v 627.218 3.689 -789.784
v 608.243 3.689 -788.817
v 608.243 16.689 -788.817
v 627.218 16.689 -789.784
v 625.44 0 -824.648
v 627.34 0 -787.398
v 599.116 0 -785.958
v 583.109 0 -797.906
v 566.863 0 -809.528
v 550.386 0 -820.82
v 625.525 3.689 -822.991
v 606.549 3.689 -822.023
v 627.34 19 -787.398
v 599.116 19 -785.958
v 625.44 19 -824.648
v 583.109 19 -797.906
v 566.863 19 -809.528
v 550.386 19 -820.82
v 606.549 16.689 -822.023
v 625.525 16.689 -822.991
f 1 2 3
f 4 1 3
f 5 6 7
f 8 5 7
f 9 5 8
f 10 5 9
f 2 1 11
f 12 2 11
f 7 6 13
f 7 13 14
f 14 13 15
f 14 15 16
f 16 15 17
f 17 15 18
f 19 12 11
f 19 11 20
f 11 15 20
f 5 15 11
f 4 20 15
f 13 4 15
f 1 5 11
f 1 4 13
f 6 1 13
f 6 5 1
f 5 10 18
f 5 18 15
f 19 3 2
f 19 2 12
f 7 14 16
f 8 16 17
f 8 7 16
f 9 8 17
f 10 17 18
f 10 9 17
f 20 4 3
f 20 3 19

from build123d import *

# Parameters (mm, degrees)
BOSS_EXTRUDE2_DEPTH = 19
SKETCH3_W           = 33.25
SKETCH3_H           = 13
CUT_EXTRUDE2_DEPTH  = 19


with BuildPart() as part:
    # Sketch1 → Boss-Extrude2 (new body)
    with BuildSketch(Plane(origin=(0, 0, 0), x_dir=(1, 0, 0), z_dir=(0, 1, 0))):
        with BuildLine():
            Line((550.386370436, 820.819715378), (625.440328141, 824.647674335))
            Line((625.440328141, 824.647674335), (627.340180934, 787.397674335))
            Line((627.340180934, 787.397674335), (599.115957856, 785.958161072))
            ThreePointArc((599.115957856, 785.958161072), (575.015419514, 803.758315189), (550.386370436, 820.819715378))
        make_face()
    extrude(amount=BOSS_EXTRUDE2_DEPTH)

    # Sketch3 → Cut-Extrude2 (cut)
    with BuildSketch(Plane(origin=(665.767785772, 0, -33.955994289), x_dir=(-0.05093655241609126, 0, -0.9987018912708451), z_dir=(0.9987018912708452, 0, -0.05093655241609127))):
        with Locations((773.435764615, 10.189365534)):
            Rectangle(SKETCH3_W, SKETCH3_H)
    extrude(amount=-CUT_EXTRUDE2_DEPTH, mode=Mode.SUBTRACT)


solid = part.part
